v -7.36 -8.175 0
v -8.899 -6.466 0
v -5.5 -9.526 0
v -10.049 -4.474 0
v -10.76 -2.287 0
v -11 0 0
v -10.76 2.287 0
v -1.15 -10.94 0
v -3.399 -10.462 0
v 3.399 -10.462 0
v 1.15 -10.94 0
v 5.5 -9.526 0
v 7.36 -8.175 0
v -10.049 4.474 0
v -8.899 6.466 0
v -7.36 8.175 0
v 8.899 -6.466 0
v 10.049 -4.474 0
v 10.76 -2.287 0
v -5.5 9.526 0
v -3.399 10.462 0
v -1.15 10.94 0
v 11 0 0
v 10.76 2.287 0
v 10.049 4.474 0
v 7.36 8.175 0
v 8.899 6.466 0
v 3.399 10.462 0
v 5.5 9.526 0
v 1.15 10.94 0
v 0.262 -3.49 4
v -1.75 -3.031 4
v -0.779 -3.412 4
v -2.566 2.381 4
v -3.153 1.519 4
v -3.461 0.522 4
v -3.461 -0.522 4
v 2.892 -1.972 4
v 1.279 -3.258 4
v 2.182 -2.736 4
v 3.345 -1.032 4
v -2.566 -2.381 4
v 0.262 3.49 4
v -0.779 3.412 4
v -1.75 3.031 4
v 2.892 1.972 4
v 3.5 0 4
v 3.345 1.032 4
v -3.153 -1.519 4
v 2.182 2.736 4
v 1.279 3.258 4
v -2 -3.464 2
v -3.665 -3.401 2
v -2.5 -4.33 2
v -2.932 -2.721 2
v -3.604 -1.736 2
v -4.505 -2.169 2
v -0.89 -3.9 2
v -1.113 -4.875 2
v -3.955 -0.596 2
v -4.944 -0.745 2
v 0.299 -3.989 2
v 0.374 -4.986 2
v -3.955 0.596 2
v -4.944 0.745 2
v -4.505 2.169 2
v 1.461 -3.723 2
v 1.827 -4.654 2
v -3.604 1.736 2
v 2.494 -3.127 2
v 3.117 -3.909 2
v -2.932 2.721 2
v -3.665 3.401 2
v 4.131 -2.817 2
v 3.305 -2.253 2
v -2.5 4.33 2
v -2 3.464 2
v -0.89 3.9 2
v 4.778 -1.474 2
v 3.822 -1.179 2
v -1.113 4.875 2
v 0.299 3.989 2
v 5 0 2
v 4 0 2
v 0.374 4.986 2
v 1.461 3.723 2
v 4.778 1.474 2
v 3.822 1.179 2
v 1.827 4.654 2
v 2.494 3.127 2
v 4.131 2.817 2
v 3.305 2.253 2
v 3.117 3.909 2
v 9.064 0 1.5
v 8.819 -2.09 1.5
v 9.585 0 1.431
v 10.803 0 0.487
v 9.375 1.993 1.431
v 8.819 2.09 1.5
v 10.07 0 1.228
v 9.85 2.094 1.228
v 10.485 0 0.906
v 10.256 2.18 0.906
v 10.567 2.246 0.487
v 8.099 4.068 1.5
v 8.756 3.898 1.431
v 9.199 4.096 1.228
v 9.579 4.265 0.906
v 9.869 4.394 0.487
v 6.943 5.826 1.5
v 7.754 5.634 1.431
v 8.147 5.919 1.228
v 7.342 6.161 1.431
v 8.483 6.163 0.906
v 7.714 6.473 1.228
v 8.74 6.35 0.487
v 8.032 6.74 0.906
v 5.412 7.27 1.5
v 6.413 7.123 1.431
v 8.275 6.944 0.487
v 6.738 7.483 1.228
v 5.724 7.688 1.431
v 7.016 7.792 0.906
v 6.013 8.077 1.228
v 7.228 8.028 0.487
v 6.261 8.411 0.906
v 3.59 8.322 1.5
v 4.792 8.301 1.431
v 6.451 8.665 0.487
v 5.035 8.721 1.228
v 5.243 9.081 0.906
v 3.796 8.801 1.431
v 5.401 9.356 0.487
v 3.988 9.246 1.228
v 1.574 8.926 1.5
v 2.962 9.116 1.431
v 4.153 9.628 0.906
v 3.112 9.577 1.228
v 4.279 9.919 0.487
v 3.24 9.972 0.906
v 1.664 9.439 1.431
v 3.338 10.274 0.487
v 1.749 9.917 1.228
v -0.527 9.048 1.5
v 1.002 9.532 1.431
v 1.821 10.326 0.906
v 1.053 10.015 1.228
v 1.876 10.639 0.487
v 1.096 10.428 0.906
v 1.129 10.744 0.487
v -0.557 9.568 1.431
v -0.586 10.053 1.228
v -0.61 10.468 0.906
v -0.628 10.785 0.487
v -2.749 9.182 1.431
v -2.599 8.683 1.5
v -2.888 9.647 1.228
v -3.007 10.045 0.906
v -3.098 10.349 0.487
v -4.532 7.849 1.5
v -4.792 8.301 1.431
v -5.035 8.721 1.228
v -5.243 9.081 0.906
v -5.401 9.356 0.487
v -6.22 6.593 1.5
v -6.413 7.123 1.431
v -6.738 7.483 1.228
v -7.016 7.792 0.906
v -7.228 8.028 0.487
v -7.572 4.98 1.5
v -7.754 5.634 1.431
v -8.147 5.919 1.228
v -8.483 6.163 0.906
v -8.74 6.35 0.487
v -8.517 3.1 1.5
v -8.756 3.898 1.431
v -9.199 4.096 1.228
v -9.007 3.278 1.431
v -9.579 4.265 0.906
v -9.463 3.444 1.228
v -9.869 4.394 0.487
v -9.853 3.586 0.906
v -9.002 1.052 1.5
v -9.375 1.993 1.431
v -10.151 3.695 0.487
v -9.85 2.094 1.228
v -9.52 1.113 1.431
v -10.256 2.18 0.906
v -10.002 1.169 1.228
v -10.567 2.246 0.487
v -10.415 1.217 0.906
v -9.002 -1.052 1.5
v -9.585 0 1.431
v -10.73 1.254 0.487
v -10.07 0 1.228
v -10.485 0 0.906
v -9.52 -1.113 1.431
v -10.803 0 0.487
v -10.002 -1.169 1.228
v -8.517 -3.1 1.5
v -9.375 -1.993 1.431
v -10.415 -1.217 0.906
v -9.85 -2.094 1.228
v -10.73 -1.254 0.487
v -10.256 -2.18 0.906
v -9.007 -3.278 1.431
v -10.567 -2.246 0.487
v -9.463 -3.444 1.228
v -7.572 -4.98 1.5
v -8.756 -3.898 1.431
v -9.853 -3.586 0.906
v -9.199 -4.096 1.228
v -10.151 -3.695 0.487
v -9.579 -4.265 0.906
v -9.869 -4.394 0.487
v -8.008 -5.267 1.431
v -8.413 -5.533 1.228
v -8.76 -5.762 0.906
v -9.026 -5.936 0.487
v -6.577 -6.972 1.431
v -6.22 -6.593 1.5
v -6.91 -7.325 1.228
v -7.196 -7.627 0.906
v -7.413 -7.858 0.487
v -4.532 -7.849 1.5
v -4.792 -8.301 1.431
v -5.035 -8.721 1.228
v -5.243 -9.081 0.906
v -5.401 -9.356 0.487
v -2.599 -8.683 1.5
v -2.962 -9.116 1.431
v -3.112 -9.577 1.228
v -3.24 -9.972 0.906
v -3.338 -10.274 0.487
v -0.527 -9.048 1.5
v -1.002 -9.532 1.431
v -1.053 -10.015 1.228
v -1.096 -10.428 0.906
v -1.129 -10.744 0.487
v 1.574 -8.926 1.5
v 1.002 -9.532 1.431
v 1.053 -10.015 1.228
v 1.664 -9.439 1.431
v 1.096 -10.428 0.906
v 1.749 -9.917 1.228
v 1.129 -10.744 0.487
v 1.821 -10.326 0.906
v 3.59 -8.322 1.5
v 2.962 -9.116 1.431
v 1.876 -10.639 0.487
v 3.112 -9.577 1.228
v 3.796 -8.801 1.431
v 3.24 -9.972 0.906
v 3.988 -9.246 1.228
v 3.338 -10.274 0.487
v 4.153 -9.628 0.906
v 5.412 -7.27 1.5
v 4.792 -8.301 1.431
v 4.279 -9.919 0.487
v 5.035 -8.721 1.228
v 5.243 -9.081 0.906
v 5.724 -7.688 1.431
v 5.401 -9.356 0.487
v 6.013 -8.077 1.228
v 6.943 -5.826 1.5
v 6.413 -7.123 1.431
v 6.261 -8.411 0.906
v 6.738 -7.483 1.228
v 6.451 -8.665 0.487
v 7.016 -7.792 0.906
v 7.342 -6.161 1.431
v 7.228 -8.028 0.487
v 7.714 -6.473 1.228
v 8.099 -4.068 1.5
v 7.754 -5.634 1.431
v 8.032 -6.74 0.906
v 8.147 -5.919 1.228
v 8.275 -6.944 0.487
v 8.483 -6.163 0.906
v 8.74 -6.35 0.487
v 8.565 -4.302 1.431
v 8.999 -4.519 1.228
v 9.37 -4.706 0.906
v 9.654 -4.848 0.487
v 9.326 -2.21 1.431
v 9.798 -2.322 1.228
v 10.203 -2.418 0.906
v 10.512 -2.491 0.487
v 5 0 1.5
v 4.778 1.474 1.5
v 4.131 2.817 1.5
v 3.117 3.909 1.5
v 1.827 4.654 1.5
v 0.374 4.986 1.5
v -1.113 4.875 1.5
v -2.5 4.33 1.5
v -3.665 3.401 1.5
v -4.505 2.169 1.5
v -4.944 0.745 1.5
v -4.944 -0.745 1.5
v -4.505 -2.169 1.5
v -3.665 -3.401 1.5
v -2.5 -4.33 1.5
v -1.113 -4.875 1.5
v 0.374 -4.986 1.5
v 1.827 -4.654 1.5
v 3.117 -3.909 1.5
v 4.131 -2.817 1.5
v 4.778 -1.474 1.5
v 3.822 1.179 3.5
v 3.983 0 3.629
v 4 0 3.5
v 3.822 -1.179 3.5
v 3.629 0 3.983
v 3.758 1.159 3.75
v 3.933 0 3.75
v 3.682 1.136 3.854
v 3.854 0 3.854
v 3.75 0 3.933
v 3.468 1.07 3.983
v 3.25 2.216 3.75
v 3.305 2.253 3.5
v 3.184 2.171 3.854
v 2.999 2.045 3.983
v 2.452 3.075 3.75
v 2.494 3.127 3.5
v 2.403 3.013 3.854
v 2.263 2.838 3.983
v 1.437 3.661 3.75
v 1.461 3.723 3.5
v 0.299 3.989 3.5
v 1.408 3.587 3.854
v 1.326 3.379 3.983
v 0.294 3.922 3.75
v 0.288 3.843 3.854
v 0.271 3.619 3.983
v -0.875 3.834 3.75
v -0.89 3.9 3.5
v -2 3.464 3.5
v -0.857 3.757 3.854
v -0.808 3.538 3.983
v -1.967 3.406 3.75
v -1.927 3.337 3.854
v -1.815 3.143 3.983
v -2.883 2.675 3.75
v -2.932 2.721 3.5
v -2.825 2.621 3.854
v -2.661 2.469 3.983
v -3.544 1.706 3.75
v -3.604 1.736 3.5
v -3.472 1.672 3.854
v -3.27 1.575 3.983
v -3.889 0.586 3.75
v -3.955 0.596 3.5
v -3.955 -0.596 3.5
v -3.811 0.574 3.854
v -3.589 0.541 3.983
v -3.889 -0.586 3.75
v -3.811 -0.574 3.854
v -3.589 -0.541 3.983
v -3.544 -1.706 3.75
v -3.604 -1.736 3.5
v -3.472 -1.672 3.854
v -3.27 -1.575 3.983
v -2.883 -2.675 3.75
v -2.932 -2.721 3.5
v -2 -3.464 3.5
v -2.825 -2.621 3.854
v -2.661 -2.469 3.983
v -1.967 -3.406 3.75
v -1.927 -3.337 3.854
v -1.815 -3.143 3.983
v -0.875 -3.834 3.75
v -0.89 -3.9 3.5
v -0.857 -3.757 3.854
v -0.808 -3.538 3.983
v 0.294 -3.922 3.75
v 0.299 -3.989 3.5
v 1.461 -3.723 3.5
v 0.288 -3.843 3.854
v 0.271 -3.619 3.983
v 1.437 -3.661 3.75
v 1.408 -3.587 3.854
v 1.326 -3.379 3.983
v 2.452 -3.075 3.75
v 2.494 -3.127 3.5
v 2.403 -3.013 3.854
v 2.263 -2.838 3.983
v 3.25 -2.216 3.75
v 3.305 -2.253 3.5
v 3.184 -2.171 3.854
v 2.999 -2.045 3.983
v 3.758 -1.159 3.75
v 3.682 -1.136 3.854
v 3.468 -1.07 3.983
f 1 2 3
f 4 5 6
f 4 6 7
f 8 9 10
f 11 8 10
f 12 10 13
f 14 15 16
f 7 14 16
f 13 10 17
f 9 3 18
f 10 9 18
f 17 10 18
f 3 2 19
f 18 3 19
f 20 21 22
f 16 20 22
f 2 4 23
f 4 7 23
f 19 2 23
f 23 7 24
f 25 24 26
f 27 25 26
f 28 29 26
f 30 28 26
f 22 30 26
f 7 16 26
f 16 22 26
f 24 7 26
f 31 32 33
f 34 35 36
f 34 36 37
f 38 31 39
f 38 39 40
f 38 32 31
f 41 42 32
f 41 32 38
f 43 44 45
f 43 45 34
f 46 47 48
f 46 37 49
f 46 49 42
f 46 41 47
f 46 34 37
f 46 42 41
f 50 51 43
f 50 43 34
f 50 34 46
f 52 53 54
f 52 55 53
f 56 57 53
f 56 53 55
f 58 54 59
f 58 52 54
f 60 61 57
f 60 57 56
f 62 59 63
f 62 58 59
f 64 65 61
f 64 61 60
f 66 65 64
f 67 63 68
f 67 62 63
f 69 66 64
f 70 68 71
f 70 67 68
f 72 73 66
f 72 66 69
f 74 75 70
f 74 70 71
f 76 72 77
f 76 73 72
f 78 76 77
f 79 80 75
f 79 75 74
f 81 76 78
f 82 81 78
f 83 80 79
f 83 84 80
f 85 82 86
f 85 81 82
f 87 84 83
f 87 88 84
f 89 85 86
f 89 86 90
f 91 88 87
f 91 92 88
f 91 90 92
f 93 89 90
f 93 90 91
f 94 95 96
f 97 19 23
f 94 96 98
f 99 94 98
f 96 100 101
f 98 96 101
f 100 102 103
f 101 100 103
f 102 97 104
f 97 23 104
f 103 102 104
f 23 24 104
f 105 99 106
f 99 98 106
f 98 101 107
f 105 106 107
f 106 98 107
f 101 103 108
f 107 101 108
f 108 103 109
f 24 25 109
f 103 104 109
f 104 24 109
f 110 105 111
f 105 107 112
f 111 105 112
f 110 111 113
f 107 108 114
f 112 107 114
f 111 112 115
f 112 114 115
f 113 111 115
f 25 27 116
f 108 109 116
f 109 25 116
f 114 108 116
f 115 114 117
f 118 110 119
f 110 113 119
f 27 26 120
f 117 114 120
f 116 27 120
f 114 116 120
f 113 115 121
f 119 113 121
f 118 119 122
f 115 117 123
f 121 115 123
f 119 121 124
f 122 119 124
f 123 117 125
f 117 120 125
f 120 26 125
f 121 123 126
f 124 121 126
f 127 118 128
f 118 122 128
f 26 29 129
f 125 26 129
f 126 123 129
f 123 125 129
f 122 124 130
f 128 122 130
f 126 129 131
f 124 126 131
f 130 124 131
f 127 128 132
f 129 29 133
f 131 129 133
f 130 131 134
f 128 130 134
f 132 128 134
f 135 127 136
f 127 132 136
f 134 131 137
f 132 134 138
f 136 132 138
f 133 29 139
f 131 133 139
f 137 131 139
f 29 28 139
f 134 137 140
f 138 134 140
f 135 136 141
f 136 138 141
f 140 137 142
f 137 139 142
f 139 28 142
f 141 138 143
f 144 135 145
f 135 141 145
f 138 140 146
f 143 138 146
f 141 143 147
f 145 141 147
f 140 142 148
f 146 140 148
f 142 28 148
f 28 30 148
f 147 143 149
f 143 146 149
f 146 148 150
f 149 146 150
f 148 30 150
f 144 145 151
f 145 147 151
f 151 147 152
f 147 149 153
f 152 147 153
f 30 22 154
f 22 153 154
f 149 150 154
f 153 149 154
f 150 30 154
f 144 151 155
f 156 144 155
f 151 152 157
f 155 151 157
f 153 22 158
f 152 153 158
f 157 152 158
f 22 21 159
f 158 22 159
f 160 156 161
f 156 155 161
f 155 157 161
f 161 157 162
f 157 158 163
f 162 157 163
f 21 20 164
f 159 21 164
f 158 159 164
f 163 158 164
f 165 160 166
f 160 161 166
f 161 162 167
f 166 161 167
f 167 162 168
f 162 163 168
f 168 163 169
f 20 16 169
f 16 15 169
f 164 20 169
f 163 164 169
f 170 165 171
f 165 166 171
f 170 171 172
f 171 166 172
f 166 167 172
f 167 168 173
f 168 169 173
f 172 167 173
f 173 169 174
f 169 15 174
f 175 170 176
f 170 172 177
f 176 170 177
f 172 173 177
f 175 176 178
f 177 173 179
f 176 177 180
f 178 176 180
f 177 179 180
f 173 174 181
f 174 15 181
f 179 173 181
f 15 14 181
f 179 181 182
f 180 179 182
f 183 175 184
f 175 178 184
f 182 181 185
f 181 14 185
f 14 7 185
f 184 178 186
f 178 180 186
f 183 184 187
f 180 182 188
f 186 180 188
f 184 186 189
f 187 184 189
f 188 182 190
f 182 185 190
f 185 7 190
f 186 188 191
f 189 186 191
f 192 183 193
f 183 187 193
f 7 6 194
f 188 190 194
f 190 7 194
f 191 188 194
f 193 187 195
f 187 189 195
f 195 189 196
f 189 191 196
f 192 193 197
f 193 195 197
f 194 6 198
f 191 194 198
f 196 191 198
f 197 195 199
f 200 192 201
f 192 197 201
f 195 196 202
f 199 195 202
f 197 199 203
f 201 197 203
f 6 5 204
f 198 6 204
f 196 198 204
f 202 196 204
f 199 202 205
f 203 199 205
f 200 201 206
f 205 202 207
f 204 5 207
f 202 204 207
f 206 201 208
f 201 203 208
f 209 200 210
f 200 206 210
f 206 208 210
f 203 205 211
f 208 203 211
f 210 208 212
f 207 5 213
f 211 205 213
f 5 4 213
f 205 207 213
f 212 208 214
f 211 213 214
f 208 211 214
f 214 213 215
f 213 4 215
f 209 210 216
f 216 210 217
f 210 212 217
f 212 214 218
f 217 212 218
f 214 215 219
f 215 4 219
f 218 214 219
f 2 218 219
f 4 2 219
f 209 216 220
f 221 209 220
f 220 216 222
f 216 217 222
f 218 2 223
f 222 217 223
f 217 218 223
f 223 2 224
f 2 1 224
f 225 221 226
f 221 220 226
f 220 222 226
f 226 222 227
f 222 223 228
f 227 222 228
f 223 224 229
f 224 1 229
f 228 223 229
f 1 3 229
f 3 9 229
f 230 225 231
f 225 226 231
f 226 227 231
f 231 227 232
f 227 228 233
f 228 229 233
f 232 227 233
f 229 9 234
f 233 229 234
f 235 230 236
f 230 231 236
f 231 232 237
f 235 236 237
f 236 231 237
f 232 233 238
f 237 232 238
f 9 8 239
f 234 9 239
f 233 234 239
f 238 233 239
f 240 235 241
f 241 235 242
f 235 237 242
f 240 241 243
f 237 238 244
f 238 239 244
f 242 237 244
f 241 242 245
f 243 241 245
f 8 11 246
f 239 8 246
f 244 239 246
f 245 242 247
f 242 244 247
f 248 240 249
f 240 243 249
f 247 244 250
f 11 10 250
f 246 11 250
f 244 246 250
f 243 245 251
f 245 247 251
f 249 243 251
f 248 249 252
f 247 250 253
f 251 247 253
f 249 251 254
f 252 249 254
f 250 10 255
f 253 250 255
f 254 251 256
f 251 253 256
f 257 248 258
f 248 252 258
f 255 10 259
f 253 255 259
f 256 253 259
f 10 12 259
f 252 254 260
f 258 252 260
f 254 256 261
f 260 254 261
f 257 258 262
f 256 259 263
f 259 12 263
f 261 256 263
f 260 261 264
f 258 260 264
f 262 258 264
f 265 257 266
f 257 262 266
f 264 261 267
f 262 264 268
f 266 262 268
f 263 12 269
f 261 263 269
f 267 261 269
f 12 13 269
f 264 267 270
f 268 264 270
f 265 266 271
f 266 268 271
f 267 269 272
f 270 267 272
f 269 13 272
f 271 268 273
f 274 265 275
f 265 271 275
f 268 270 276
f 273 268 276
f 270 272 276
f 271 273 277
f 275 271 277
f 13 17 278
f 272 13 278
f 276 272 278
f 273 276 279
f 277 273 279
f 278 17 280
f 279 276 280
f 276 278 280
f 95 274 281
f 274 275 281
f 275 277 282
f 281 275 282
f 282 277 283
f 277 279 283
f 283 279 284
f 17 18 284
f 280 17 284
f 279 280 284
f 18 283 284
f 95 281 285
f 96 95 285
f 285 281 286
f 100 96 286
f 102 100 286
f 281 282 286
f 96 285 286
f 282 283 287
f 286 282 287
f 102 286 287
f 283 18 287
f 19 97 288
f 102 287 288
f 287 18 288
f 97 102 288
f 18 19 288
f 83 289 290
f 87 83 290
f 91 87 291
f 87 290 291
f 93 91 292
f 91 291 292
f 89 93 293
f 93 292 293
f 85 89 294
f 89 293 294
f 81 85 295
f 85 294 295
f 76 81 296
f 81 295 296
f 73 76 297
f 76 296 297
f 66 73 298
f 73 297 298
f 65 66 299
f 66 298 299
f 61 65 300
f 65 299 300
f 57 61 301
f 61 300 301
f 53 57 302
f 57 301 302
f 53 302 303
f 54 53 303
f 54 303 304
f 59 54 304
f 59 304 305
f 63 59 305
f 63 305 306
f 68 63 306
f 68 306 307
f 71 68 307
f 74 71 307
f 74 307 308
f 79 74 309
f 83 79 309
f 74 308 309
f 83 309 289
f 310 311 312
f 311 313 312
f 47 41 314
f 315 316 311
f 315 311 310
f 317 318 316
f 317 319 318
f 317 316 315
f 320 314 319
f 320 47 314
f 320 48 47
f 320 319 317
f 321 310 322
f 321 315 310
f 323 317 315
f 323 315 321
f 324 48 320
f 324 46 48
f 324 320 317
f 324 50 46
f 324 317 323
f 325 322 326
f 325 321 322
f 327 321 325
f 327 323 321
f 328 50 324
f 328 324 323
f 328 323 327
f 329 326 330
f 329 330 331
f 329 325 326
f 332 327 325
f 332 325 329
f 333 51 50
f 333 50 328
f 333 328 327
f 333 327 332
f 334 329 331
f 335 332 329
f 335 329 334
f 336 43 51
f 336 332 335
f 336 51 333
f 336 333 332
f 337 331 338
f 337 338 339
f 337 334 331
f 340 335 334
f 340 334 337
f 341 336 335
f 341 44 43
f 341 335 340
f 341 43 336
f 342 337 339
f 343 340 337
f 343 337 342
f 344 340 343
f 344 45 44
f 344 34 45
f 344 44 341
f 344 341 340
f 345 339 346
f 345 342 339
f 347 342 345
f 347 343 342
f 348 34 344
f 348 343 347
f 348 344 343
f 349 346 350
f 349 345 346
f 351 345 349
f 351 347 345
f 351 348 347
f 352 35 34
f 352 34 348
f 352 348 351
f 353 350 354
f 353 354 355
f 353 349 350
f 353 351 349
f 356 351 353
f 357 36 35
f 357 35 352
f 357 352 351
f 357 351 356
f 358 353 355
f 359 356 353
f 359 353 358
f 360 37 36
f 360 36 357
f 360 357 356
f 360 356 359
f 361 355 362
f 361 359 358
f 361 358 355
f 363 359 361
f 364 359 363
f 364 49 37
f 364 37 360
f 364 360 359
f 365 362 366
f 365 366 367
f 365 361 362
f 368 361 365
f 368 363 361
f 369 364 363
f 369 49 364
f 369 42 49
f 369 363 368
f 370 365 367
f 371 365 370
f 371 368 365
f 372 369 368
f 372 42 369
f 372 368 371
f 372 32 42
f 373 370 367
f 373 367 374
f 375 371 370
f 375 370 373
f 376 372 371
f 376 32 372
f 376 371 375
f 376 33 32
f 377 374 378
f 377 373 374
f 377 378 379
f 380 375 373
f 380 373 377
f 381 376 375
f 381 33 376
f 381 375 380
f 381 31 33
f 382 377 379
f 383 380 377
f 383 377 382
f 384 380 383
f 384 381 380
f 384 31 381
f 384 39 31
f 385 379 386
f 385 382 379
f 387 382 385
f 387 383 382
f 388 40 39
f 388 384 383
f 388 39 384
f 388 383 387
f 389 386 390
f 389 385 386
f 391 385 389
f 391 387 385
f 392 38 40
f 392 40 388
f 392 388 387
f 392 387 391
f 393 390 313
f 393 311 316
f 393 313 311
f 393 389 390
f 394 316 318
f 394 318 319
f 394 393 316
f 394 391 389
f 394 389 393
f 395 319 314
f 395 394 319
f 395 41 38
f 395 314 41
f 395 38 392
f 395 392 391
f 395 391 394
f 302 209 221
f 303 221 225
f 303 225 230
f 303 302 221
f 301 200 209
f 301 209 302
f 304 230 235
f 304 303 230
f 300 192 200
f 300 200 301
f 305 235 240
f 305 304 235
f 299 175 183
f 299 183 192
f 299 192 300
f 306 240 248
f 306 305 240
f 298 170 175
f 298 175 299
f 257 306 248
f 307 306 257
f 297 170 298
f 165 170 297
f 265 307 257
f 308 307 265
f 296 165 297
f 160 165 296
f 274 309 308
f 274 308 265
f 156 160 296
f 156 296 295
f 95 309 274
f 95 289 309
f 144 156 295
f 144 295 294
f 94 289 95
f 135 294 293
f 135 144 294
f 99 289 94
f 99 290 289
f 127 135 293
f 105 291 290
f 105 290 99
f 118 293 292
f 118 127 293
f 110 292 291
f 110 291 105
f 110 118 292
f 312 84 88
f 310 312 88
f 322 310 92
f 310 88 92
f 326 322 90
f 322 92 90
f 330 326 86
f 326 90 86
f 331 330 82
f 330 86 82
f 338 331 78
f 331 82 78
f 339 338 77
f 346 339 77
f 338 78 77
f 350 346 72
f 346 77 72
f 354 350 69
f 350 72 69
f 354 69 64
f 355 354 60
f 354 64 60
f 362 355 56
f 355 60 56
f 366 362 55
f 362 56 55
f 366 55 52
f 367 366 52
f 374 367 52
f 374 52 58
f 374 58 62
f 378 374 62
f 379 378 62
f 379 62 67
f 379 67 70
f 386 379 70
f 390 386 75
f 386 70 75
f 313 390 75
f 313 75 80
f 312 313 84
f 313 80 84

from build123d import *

# Parameters (mm, degrees)
F0_R     = 11
F1_DEPTH = 1.5
F2_R     = 5
F3_DEPTH = 0.5
F4_R     = 4
F5_DEPTH = 2
F6_R     = 0.5


# Not quite as in the source:
# - a fillet or chamfer that OpenCascade refuses, or shapes differently, is made with other operations: its cross-section is extruded or revolved along the edge and cut away or added


with BuildPart() as f1:
    # F0 (on Top) → F1 (new body)
    with BuildSketch(Plane.XY):
        Circle(F0_R)
    extrude(amount=F1_DEPTH)

    # F2 (on face) → F3 (join)
    with BuildSketch(Plane.XY.offset(1.5)):
        Circle(F2_R)
    extrude(amount=F3_DEPTH)

    # F4 (on face) → F5 (join)
    with BuildSketch(Plane.XY.offset(2)):
        Circle(F4_R)
    extrude(amount=F5_DEPTH)

    # F6
    f6_edges = [f1.edges().sort_by_distance(p)[0] for p in [
        (-4, 0, 4),
    ]]
    fillet(f6_edges, radius=F6_R)

    # F7: fillet of radius 2 on 1 edges, made by hand

    # F7_s1 → F7_t2 (revolve, cut)
    with BuildSketch(Plane.XZ):
        with BuildLine():
            ThreePointArc((9.0635083269, 1.5), (10.2882531983, 1.0811388301), (11, 0))
            Line((11, 0), (11, 1.5))
            Line((11, 1.5), (9.0635083269, 1.5))
        make_face()
    revolve(axis=Axis((0, 0, 1.5), (0, 0, 1)), mode=Mode.SUBTRACT)


solid = f1.part
